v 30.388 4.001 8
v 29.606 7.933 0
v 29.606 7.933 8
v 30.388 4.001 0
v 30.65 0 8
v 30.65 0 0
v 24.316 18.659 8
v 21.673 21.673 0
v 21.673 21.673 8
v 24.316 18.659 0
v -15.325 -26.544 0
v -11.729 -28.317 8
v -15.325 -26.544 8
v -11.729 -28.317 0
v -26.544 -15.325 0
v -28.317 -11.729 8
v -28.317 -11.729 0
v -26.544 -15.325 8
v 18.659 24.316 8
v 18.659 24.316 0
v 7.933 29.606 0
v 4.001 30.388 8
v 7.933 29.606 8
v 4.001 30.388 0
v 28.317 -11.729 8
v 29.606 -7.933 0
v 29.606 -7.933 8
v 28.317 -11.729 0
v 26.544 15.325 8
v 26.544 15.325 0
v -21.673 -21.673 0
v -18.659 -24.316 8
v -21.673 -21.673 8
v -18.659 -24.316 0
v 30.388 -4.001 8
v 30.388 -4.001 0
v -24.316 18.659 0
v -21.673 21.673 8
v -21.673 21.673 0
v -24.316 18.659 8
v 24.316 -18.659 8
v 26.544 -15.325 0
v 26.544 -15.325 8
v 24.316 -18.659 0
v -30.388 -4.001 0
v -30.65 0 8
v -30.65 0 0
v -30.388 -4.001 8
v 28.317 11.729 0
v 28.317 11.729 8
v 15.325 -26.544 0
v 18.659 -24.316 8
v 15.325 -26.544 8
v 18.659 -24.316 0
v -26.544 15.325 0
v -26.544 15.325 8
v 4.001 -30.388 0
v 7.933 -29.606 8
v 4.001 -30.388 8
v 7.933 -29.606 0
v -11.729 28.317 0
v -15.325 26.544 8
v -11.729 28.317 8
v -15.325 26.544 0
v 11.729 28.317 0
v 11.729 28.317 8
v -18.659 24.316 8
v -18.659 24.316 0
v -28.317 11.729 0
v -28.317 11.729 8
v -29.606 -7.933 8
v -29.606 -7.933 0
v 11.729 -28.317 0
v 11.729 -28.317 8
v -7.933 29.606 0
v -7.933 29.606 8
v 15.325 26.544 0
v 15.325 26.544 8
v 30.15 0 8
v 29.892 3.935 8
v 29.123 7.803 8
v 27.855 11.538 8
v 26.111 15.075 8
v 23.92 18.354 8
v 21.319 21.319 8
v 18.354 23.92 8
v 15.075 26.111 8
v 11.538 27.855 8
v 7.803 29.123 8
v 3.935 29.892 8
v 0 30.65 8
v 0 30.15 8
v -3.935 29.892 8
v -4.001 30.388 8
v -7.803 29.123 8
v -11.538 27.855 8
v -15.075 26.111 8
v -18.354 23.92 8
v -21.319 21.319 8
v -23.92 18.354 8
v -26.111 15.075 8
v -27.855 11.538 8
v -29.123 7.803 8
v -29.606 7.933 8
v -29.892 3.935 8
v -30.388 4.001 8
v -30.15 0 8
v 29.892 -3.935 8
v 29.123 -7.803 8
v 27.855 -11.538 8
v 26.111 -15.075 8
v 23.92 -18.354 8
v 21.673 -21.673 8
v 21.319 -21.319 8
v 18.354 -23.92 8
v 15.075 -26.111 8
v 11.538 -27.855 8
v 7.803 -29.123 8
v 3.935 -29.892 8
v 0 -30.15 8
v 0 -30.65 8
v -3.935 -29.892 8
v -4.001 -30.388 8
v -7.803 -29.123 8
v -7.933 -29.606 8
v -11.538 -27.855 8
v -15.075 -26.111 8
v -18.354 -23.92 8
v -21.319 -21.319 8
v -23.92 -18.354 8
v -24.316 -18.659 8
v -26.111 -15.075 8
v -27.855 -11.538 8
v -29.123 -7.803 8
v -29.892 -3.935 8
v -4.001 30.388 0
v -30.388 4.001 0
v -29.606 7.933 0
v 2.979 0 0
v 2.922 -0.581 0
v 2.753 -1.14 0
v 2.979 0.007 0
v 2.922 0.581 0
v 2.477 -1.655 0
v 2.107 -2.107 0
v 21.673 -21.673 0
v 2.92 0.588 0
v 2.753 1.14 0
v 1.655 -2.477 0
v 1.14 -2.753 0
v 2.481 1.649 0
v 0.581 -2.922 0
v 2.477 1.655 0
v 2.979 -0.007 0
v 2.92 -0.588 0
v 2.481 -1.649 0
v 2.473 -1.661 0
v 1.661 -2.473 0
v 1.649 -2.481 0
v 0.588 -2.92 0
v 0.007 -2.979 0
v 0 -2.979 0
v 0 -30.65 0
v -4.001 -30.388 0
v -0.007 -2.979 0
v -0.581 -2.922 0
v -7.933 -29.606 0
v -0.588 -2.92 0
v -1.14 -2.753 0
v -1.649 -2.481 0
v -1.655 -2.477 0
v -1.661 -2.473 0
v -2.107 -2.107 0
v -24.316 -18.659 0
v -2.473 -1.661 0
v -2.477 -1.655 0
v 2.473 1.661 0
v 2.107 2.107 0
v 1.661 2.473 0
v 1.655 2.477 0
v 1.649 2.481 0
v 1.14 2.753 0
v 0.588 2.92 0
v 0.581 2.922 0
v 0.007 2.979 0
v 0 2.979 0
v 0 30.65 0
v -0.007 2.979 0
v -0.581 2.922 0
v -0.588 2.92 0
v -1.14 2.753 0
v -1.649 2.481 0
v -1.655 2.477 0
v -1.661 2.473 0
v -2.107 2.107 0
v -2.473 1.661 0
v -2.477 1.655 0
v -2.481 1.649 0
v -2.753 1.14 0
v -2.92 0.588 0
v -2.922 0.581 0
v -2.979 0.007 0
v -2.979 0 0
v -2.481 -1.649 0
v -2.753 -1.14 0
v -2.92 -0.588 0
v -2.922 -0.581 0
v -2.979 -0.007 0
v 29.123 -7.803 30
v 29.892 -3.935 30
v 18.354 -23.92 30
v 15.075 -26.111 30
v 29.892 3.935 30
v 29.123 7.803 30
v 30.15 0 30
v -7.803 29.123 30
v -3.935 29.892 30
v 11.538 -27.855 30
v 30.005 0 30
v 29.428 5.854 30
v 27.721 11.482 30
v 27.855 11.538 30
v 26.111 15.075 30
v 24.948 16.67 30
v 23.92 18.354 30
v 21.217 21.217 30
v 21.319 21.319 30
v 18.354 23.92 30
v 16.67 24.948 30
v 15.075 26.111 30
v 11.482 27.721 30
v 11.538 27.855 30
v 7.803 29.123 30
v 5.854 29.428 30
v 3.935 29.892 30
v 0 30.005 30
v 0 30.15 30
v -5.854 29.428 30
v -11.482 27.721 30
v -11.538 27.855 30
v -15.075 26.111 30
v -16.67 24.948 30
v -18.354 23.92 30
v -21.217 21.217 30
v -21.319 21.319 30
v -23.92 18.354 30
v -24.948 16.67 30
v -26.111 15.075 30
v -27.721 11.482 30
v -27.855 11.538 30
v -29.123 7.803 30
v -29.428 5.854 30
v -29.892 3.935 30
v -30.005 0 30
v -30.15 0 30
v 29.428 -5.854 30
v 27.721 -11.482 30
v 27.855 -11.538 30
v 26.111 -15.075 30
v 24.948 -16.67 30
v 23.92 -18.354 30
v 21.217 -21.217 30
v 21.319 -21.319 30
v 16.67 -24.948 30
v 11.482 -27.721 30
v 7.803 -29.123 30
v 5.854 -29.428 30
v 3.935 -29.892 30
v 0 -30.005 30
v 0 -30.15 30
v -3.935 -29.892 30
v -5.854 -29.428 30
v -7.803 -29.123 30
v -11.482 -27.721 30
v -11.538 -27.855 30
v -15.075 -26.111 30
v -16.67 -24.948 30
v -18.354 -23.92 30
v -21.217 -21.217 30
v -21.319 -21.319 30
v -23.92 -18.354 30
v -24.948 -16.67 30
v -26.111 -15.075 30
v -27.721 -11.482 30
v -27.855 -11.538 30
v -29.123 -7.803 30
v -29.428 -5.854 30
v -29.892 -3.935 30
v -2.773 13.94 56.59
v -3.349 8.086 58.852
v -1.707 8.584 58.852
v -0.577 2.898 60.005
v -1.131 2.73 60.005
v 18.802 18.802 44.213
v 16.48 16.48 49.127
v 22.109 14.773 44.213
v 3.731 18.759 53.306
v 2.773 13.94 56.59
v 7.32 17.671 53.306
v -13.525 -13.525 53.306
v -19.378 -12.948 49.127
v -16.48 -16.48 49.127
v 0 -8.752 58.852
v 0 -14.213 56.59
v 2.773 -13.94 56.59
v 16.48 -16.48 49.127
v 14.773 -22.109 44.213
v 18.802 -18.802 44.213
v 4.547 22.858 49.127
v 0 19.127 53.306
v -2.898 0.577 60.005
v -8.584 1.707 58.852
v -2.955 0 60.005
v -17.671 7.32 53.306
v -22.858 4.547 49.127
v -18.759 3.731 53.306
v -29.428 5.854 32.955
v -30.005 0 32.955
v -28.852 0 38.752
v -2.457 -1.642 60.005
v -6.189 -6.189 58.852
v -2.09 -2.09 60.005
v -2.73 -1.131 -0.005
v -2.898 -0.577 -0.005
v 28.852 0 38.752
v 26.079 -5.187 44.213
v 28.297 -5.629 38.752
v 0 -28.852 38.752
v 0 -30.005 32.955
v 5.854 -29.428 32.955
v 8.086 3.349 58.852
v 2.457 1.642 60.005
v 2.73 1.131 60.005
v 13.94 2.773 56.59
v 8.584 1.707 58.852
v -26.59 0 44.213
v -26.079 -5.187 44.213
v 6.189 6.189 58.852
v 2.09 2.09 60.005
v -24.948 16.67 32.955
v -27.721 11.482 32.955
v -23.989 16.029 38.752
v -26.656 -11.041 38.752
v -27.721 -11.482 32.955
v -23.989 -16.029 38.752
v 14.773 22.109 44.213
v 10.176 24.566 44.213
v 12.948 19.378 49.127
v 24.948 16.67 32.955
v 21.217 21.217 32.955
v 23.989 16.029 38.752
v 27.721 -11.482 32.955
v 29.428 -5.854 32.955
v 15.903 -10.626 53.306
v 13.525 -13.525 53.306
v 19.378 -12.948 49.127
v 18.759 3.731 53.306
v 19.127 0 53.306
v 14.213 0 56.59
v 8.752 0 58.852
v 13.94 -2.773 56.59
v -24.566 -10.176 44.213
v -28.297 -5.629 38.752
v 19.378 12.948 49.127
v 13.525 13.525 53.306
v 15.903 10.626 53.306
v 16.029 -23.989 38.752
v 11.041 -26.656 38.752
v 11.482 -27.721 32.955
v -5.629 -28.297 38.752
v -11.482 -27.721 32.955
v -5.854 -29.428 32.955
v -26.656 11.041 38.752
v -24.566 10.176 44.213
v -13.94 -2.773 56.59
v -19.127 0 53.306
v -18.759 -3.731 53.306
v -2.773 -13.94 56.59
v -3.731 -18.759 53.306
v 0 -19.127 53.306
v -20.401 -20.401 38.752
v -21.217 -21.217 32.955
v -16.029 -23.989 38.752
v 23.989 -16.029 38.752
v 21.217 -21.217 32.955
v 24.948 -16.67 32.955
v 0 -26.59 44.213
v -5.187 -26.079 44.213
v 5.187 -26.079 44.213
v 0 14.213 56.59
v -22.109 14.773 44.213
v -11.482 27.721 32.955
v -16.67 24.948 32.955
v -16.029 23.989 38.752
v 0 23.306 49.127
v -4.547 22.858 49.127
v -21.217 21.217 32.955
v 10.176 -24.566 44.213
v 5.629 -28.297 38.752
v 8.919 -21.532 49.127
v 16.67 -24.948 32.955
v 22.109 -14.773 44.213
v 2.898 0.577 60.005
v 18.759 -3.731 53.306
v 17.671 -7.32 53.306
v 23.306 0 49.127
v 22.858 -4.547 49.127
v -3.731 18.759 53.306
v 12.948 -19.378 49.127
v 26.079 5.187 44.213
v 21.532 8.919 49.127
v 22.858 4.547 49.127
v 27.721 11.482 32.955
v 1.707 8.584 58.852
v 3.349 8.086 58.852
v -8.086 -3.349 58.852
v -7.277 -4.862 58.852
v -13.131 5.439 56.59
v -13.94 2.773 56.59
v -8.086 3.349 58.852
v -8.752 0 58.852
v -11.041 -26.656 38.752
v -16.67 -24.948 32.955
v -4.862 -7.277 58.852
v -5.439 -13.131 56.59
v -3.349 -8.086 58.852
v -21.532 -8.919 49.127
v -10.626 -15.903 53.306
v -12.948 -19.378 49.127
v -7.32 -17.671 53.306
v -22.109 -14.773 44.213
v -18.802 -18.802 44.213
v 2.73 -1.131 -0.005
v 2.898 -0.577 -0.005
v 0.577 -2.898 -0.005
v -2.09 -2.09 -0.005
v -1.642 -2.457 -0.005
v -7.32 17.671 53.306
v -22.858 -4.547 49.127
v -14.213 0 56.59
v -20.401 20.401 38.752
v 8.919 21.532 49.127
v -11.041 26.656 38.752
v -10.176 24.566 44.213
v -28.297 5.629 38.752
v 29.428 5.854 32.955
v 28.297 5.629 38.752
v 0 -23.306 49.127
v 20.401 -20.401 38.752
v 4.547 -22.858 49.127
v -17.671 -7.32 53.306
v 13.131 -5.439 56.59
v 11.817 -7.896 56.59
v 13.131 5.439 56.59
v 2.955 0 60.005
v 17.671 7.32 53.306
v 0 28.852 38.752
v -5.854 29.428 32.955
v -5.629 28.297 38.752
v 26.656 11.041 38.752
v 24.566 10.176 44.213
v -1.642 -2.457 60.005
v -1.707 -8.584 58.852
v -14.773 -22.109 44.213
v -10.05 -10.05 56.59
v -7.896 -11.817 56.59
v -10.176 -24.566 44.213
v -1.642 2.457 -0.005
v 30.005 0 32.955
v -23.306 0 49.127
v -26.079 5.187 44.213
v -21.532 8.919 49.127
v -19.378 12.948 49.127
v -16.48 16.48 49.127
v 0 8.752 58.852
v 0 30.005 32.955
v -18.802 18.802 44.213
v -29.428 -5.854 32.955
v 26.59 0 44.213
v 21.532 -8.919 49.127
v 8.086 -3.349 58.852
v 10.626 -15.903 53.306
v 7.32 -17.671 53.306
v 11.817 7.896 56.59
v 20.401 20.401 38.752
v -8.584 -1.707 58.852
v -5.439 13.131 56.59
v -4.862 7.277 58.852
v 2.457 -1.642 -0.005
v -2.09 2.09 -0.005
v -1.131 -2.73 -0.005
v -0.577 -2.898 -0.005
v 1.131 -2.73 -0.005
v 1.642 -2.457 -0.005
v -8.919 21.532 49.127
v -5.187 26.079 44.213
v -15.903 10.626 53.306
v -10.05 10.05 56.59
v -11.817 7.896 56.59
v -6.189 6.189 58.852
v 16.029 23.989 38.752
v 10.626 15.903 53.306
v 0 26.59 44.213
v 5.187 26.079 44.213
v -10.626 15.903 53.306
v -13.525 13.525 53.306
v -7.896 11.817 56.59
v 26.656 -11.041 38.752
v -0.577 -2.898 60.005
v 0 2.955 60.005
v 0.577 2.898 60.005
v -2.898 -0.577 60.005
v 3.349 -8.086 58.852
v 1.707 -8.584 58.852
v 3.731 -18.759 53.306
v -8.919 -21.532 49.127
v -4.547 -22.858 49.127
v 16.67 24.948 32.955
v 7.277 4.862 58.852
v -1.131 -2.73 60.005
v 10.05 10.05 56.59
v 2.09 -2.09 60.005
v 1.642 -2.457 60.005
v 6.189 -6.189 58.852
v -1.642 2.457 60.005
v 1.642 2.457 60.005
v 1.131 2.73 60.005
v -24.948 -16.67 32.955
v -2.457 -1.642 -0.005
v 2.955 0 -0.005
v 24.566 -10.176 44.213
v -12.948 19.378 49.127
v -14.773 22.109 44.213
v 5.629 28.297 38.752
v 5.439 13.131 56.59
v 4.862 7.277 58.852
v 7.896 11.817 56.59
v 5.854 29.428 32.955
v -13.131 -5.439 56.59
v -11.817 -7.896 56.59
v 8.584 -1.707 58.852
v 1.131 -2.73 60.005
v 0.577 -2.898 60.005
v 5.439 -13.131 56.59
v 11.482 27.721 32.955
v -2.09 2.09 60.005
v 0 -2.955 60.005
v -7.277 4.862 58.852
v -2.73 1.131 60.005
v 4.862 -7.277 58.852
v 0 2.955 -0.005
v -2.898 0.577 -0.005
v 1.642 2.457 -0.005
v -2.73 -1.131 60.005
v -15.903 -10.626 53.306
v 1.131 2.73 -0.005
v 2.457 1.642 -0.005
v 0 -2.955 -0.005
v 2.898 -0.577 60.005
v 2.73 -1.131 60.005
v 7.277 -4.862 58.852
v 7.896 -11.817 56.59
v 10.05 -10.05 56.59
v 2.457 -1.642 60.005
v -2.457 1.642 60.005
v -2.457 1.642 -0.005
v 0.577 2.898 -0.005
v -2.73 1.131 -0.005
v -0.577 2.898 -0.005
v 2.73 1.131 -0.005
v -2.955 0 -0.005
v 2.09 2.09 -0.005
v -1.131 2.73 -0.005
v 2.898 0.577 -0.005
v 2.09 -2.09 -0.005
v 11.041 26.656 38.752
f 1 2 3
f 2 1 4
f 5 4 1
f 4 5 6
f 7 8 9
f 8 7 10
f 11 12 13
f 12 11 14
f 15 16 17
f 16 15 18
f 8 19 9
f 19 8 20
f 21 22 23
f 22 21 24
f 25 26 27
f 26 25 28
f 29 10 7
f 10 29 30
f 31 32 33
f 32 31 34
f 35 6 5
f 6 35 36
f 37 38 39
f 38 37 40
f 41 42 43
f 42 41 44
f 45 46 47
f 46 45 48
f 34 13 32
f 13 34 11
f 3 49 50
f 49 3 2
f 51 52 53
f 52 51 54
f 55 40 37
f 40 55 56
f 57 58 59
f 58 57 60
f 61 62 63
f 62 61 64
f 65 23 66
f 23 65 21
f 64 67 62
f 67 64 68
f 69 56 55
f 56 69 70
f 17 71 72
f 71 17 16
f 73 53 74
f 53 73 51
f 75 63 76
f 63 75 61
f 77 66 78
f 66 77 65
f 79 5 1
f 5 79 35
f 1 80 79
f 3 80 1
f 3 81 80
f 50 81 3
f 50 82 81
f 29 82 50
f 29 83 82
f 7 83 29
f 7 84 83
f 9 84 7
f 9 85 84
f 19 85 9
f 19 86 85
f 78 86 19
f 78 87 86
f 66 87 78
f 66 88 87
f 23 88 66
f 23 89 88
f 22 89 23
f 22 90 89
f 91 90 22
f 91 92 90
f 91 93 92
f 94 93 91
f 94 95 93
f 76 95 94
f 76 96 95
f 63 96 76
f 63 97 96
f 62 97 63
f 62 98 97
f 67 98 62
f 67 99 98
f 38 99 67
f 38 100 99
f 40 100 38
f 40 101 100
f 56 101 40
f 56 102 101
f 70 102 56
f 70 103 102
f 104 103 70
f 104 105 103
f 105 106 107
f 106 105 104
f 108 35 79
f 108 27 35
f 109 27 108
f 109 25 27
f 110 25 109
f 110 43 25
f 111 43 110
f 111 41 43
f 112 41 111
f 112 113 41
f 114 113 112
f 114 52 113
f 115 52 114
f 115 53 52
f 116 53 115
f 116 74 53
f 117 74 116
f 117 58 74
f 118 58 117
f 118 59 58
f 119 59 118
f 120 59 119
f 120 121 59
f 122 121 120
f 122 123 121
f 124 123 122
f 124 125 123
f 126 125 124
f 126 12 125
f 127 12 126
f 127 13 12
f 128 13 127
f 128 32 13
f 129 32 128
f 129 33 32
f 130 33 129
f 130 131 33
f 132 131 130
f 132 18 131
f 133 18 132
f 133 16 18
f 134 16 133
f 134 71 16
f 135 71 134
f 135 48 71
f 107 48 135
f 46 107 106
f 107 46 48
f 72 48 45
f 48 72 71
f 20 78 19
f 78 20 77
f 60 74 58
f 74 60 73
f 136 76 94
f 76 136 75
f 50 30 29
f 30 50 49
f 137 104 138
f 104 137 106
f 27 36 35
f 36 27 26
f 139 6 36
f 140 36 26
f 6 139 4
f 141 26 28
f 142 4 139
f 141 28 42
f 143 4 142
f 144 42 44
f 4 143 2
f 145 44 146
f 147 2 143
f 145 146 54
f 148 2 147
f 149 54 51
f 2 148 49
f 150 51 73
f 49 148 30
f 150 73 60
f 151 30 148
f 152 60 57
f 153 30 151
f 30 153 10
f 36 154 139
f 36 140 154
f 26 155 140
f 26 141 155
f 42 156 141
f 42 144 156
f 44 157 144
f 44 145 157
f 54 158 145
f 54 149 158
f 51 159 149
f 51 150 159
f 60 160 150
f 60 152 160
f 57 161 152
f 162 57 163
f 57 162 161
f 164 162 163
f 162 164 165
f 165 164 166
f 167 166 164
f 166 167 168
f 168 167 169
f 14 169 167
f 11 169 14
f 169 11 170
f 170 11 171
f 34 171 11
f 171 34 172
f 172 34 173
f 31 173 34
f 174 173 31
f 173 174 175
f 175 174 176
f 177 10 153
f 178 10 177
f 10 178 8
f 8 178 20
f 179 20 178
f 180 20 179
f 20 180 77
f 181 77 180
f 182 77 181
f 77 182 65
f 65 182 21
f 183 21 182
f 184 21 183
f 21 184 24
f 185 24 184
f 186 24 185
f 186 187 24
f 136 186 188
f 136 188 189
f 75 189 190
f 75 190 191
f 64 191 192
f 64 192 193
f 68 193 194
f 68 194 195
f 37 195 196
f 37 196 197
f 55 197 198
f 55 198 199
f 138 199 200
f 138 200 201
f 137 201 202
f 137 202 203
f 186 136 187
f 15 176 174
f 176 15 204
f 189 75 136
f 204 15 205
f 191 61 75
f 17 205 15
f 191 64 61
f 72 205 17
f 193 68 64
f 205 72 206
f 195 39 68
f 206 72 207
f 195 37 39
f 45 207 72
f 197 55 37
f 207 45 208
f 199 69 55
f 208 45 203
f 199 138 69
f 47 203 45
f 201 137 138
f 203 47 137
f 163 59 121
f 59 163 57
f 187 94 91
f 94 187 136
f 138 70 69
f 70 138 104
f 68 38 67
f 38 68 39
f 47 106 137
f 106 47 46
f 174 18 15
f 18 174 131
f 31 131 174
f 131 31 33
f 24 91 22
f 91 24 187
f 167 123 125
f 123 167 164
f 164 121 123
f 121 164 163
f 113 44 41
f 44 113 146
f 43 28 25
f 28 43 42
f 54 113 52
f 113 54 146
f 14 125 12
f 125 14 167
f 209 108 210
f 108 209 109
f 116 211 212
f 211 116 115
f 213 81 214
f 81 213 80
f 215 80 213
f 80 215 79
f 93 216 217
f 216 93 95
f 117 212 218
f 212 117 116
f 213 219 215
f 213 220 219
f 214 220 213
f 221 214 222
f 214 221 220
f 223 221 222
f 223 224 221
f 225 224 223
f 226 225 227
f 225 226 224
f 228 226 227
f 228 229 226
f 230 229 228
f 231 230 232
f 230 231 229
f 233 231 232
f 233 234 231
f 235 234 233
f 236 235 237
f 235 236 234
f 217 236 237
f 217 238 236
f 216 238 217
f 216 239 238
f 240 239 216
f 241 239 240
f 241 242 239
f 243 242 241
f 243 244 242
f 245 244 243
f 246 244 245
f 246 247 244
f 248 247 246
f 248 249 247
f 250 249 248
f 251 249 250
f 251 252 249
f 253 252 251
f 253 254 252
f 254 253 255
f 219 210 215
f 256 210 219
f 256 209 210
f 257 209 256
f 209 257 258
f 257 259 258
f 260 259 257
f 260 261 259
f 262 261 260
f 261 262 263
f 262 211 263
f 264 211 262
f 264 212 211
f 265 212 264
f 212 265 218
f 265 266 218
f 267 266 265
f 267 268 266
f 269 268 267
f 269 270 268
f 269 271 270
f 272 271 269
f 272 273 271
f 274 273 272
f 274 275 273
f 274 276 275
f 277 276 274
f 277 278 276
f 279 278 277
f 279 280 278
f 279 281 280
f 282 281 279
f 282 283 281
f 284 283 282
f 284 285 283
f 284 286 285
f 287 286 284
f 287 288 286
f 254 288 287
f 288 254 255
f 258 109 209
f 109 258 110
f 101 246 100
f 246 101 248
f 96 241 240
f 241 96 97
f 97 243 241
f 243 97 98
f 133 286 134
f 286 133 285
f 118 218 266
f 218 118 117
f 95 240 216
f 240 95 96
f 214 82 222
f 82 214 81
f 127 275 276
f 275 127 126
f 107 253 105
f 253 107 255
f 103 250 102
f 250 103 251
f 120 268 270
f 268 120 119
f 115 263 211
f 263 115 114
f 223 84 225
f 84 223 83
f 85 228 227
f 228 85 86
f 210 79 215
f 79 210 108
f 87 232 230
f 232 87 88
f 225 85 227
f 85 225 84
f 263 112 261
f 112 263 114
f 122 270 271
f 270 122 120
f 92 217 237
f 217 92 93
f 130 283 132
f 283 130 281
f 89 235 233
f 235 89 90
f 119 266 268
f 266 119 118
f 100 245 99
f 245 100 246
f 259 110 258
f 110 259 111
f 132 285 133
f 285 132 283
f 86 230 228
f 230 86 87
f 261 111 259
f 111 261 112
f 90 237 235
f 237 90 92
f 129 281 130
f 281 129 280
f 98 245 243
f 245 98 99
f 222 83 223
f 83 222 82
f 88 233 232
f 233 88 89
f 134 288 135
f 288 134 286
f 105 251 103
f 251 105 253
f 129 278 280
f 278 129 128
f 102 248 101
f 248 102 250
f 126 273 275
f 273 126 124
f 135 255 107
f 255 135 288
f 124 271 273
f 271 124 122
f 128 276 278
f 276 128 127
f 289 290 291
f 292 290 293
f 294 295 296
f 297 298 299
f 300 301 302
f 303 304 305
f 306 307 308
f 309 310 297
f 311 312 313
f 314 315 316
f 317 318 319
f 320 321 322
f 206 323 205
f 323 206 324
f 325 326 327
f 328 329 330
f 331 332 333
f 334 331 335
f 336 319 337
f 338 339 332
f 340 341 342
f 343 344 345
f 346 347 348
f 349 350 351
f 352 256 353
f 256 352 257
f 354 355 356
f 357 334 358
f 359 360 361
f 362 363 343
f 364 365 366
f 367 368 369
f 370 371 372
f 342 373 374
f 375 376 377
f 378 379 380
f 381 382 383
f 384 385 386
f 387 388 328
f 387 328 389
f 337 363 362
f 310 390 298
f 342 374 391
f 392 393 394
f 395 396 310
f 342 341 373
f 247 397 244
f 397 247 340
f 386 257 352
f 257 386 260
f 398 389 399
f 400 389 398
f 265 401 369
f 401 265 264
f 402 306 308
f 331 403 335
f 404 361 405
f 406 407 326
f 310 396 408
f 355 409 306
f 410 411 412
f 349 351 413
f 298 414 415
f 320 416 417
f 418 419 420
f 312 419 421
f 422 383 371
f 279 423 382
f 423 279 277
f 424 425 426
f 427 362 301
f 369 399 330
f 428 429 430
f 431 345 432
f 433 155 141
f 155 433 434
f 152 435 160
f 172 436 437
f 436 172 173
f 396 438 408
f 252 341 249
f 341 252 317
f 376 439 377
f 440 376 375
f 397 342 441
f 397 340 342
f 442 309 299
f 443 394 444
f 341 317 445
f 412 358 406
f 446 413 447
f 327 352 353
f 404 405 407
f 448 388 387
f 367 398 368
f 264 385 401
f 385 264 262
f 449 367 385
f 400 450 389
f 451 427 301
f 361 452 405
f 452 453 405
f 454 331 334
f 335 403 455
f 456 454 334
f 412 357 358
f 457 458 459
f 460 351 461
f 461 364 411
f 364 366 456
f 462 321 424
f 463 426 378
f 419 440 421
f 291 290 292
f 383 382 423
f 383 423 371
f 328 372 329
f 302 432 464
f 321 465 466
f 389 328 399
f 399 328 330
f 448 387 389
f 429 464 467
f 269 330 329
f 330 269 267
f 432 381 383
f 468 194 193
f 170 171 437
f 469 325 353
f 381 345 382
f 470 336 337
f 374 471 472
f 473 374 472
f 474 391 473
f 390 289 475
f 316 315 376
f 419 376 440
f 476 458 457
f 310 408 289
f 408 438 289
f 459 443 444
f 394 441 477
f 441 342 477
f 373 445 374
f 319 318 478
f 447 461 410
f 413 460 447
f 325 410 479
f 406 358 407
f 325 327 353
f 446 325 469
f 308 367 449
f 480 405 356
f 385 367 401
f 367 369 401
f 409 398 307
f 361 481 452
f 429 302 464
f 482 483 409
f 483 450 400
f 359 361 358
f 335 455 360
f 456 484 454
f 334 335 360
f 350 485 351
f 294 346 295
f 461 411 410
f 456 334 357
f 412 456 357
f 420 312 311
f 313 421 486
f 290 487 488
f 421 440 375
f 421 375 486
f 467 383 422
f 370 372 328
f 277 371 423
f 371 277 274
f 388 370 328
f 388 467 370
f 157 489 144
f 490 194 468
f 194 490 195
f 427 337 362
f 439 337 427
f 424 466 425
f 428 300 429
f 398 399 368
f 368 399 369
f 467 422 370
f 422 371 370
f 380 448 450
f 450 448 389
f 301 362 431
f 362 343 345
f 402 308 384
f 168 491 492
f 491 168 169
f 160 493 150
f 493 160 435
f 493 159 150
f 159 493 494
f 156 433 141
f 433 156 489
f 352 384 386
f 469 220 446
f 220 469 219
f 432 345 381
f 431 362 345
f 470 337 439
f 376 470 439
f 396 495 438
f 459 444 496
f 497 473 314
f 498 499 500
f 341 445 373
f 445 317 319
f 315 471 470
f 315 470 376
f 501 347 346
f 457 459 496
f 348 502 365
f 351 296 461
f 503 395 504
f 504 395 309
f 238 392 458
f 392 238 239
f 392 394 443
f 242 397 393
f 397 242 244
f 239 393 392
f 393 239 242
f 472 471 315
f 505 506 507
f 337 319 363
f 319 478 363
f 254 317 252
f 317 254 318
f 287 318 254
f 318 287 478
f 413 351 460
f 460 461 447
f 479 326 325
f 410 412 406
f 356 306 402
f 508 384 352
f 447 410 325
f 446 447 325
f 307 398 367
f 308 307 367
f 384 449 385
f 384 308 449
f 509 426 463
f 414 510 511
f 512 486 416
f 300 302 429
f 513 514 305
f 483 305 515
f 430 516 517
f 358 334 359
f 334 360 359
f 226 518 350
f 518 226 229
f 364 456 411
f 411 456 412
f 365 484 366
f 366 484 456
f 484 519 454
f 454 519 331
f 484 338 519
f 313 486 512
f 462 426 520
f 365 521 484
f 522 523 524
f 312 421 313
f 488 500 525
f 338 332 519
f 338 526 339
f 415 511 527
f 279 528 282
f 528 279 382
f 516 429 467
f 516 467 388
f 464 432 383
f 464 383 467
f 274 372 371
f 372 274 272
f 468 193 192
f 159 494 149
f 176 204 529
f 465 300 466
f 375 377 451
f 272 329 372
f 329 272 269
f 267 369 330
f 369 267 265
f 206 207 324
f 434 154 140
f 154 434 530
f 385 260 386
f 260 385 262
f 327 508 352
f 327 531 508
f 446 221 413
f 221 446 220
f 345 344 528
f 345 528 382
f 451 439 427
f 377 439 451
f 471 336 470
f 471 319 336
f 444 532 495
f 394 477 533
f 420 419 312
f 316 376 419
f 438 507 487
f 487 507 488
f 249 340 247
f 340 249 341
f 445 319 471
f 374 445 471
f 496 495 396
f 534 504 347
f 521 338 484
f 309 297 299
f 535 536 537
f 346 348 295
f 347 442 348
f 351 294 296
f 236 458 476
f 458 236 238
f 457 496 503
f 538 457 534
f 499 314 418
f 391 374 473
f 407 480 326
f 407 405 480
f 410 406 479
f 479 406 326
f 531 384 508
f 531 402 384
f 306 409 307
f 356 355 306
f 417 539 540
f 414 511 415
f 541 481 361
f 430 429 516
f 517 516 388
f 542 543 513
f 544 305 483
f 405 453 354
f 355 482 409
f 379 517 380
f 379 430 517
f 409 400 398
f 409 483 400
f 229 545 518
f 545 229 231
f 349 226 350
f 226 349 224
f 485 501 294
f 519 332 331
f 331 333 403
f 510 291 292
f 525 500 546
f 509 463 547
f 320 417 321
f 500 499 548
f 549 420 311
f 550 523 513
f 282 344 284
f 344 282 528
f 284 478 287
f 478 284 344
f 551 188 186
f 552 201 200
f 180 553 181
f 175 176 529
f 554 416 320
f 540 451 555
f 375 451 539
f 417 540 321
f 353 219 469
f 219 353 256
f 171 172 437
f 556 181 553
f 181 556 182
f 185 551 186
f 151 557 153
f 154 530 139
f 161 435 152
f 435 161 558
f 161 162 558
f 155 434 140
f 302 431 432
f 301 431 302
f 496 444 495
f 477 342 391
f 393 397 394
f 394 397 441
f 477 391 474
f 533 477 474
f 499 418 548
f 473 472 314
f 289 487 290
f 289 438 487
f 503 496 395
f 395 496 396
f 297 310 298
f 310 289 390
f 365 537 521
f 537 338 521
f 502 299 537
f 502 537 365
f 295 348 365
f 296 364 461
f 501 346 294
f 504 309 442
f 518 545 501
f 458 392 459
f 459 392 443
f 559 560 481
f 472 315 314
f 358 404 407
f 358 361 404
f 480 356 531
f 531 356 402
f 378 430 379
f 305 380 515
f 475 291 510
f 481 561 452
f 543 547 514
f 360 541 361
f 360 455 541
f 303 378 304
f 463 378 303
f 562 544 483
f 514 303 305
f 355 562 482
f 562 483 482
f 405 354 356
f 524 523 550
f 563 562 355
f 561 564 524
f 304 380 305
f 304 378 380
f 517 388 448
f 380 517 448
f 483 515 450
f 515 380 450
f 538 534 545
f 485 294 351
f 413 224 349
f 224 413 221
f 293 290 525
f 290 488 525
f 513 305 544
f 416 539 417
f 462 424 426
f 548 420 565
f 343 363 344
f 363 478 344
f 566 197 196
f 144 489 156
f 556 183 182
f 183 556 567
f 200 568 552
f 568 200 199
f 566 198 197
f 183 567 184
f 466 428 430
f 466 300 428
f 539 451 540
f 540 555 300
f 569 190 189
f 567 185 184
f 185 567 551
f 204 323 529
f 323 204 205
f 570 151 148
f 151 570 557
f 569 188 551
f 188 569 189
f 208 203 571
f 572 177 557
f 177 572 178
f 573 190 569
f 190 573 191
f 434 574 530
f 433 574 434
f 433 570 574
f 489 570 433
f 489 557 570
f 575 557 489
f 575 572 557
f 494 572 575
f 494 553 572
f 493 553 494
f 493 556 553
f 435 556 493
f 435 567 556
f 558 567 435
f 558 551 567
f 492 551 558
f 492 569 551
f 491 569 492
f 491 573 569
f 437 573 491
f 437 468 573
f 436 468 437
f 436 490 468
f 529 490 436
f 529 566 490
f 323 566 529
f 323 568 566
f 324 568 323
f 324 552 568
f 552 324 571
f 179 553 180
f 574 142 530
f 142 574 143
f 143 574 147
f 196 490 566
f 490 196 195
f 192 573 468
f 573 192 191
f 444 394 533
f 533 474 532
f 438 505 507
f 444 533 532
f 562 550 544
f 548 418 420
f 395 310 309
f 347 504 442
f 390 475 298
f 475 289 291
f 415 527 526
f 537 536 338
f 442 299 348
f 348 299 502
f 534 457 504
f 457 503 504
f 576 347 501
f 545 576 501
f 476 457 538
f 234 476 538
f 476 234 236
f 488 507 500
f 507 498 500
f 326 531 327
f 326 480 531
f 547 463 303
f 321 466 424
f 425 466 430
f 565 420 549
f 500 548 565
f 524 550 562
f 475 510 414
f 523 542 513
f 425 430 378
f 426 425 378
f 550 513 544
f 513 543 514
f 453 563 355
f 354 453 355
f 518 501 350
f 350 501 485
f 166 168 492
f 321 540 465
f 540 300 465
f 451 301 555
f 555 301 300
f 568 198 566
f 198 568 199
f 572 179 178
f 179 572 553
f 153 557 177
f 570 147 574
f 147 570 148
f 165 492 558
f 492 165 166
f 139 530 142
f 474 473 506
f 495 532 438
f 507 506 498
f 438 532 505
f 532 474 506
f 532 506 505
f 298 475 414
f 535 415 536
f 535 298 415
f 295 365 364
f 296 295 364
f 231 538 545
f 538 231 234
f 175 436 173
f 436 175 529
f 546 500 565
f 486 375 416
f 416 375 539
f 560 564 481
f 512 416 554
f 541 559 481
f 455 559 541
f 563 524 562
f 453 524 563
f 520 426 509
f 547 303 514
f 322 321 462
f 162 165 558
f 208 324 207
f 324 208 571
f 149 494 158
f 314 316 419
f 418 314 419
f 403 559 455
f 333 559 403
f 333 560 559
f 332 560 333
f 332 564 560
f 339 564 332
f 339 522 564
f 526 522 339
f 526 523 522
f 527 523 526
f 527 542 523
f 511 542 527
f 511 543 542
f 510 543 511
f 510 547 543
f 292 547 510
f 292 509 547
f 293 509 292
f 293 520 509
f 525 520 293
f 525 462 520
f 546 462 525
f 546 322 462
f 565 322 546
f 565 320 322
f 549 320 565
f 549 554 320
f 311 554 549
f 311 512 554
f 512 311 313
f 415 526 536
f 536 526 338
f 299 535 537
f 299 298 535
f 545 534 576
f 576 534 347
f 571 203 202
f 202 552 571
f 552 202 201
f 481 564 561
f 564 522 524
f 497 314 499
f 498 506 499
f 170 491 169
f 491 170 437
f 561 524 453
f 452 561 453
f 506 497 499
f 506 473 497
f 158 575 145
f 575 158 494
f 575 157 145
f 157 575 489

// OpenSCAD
// End cap — grooved.
//
// @part cap_end
// @kind fitting
// @category fitting.cap
// @display-name "Grooved End Cap (2\")"
// @mfg victaulic
// @mfg-pn Style-60
// @price-usd 4.80
// @install-minutes 3
// @crew apprentice
// @param size_in enum[1,1.25,1.5,2,2.5,3,4] default=2 label="Size" unit="in"
// @port in position=[0,0,0] direction=[0,0,-1] style=grooved size_in=2 role=run_a

od = 60.3;
cap_h = 30;
groove_w = 8;
union() {
    cylinder(h = cap_h, d = od, $fn = 48);
    translate([0, 0, cap_h])
        sphere(d = od, $fn = 32);
    // Groove ring
    difference() {
        cylinder(h = groove_w, d = od + 1, $fn = 48);
        translate([0, 0, -0.1])
            cylinder(h = groove_w + 0.2, d = od - 2, $fn = 48);
    }
}
